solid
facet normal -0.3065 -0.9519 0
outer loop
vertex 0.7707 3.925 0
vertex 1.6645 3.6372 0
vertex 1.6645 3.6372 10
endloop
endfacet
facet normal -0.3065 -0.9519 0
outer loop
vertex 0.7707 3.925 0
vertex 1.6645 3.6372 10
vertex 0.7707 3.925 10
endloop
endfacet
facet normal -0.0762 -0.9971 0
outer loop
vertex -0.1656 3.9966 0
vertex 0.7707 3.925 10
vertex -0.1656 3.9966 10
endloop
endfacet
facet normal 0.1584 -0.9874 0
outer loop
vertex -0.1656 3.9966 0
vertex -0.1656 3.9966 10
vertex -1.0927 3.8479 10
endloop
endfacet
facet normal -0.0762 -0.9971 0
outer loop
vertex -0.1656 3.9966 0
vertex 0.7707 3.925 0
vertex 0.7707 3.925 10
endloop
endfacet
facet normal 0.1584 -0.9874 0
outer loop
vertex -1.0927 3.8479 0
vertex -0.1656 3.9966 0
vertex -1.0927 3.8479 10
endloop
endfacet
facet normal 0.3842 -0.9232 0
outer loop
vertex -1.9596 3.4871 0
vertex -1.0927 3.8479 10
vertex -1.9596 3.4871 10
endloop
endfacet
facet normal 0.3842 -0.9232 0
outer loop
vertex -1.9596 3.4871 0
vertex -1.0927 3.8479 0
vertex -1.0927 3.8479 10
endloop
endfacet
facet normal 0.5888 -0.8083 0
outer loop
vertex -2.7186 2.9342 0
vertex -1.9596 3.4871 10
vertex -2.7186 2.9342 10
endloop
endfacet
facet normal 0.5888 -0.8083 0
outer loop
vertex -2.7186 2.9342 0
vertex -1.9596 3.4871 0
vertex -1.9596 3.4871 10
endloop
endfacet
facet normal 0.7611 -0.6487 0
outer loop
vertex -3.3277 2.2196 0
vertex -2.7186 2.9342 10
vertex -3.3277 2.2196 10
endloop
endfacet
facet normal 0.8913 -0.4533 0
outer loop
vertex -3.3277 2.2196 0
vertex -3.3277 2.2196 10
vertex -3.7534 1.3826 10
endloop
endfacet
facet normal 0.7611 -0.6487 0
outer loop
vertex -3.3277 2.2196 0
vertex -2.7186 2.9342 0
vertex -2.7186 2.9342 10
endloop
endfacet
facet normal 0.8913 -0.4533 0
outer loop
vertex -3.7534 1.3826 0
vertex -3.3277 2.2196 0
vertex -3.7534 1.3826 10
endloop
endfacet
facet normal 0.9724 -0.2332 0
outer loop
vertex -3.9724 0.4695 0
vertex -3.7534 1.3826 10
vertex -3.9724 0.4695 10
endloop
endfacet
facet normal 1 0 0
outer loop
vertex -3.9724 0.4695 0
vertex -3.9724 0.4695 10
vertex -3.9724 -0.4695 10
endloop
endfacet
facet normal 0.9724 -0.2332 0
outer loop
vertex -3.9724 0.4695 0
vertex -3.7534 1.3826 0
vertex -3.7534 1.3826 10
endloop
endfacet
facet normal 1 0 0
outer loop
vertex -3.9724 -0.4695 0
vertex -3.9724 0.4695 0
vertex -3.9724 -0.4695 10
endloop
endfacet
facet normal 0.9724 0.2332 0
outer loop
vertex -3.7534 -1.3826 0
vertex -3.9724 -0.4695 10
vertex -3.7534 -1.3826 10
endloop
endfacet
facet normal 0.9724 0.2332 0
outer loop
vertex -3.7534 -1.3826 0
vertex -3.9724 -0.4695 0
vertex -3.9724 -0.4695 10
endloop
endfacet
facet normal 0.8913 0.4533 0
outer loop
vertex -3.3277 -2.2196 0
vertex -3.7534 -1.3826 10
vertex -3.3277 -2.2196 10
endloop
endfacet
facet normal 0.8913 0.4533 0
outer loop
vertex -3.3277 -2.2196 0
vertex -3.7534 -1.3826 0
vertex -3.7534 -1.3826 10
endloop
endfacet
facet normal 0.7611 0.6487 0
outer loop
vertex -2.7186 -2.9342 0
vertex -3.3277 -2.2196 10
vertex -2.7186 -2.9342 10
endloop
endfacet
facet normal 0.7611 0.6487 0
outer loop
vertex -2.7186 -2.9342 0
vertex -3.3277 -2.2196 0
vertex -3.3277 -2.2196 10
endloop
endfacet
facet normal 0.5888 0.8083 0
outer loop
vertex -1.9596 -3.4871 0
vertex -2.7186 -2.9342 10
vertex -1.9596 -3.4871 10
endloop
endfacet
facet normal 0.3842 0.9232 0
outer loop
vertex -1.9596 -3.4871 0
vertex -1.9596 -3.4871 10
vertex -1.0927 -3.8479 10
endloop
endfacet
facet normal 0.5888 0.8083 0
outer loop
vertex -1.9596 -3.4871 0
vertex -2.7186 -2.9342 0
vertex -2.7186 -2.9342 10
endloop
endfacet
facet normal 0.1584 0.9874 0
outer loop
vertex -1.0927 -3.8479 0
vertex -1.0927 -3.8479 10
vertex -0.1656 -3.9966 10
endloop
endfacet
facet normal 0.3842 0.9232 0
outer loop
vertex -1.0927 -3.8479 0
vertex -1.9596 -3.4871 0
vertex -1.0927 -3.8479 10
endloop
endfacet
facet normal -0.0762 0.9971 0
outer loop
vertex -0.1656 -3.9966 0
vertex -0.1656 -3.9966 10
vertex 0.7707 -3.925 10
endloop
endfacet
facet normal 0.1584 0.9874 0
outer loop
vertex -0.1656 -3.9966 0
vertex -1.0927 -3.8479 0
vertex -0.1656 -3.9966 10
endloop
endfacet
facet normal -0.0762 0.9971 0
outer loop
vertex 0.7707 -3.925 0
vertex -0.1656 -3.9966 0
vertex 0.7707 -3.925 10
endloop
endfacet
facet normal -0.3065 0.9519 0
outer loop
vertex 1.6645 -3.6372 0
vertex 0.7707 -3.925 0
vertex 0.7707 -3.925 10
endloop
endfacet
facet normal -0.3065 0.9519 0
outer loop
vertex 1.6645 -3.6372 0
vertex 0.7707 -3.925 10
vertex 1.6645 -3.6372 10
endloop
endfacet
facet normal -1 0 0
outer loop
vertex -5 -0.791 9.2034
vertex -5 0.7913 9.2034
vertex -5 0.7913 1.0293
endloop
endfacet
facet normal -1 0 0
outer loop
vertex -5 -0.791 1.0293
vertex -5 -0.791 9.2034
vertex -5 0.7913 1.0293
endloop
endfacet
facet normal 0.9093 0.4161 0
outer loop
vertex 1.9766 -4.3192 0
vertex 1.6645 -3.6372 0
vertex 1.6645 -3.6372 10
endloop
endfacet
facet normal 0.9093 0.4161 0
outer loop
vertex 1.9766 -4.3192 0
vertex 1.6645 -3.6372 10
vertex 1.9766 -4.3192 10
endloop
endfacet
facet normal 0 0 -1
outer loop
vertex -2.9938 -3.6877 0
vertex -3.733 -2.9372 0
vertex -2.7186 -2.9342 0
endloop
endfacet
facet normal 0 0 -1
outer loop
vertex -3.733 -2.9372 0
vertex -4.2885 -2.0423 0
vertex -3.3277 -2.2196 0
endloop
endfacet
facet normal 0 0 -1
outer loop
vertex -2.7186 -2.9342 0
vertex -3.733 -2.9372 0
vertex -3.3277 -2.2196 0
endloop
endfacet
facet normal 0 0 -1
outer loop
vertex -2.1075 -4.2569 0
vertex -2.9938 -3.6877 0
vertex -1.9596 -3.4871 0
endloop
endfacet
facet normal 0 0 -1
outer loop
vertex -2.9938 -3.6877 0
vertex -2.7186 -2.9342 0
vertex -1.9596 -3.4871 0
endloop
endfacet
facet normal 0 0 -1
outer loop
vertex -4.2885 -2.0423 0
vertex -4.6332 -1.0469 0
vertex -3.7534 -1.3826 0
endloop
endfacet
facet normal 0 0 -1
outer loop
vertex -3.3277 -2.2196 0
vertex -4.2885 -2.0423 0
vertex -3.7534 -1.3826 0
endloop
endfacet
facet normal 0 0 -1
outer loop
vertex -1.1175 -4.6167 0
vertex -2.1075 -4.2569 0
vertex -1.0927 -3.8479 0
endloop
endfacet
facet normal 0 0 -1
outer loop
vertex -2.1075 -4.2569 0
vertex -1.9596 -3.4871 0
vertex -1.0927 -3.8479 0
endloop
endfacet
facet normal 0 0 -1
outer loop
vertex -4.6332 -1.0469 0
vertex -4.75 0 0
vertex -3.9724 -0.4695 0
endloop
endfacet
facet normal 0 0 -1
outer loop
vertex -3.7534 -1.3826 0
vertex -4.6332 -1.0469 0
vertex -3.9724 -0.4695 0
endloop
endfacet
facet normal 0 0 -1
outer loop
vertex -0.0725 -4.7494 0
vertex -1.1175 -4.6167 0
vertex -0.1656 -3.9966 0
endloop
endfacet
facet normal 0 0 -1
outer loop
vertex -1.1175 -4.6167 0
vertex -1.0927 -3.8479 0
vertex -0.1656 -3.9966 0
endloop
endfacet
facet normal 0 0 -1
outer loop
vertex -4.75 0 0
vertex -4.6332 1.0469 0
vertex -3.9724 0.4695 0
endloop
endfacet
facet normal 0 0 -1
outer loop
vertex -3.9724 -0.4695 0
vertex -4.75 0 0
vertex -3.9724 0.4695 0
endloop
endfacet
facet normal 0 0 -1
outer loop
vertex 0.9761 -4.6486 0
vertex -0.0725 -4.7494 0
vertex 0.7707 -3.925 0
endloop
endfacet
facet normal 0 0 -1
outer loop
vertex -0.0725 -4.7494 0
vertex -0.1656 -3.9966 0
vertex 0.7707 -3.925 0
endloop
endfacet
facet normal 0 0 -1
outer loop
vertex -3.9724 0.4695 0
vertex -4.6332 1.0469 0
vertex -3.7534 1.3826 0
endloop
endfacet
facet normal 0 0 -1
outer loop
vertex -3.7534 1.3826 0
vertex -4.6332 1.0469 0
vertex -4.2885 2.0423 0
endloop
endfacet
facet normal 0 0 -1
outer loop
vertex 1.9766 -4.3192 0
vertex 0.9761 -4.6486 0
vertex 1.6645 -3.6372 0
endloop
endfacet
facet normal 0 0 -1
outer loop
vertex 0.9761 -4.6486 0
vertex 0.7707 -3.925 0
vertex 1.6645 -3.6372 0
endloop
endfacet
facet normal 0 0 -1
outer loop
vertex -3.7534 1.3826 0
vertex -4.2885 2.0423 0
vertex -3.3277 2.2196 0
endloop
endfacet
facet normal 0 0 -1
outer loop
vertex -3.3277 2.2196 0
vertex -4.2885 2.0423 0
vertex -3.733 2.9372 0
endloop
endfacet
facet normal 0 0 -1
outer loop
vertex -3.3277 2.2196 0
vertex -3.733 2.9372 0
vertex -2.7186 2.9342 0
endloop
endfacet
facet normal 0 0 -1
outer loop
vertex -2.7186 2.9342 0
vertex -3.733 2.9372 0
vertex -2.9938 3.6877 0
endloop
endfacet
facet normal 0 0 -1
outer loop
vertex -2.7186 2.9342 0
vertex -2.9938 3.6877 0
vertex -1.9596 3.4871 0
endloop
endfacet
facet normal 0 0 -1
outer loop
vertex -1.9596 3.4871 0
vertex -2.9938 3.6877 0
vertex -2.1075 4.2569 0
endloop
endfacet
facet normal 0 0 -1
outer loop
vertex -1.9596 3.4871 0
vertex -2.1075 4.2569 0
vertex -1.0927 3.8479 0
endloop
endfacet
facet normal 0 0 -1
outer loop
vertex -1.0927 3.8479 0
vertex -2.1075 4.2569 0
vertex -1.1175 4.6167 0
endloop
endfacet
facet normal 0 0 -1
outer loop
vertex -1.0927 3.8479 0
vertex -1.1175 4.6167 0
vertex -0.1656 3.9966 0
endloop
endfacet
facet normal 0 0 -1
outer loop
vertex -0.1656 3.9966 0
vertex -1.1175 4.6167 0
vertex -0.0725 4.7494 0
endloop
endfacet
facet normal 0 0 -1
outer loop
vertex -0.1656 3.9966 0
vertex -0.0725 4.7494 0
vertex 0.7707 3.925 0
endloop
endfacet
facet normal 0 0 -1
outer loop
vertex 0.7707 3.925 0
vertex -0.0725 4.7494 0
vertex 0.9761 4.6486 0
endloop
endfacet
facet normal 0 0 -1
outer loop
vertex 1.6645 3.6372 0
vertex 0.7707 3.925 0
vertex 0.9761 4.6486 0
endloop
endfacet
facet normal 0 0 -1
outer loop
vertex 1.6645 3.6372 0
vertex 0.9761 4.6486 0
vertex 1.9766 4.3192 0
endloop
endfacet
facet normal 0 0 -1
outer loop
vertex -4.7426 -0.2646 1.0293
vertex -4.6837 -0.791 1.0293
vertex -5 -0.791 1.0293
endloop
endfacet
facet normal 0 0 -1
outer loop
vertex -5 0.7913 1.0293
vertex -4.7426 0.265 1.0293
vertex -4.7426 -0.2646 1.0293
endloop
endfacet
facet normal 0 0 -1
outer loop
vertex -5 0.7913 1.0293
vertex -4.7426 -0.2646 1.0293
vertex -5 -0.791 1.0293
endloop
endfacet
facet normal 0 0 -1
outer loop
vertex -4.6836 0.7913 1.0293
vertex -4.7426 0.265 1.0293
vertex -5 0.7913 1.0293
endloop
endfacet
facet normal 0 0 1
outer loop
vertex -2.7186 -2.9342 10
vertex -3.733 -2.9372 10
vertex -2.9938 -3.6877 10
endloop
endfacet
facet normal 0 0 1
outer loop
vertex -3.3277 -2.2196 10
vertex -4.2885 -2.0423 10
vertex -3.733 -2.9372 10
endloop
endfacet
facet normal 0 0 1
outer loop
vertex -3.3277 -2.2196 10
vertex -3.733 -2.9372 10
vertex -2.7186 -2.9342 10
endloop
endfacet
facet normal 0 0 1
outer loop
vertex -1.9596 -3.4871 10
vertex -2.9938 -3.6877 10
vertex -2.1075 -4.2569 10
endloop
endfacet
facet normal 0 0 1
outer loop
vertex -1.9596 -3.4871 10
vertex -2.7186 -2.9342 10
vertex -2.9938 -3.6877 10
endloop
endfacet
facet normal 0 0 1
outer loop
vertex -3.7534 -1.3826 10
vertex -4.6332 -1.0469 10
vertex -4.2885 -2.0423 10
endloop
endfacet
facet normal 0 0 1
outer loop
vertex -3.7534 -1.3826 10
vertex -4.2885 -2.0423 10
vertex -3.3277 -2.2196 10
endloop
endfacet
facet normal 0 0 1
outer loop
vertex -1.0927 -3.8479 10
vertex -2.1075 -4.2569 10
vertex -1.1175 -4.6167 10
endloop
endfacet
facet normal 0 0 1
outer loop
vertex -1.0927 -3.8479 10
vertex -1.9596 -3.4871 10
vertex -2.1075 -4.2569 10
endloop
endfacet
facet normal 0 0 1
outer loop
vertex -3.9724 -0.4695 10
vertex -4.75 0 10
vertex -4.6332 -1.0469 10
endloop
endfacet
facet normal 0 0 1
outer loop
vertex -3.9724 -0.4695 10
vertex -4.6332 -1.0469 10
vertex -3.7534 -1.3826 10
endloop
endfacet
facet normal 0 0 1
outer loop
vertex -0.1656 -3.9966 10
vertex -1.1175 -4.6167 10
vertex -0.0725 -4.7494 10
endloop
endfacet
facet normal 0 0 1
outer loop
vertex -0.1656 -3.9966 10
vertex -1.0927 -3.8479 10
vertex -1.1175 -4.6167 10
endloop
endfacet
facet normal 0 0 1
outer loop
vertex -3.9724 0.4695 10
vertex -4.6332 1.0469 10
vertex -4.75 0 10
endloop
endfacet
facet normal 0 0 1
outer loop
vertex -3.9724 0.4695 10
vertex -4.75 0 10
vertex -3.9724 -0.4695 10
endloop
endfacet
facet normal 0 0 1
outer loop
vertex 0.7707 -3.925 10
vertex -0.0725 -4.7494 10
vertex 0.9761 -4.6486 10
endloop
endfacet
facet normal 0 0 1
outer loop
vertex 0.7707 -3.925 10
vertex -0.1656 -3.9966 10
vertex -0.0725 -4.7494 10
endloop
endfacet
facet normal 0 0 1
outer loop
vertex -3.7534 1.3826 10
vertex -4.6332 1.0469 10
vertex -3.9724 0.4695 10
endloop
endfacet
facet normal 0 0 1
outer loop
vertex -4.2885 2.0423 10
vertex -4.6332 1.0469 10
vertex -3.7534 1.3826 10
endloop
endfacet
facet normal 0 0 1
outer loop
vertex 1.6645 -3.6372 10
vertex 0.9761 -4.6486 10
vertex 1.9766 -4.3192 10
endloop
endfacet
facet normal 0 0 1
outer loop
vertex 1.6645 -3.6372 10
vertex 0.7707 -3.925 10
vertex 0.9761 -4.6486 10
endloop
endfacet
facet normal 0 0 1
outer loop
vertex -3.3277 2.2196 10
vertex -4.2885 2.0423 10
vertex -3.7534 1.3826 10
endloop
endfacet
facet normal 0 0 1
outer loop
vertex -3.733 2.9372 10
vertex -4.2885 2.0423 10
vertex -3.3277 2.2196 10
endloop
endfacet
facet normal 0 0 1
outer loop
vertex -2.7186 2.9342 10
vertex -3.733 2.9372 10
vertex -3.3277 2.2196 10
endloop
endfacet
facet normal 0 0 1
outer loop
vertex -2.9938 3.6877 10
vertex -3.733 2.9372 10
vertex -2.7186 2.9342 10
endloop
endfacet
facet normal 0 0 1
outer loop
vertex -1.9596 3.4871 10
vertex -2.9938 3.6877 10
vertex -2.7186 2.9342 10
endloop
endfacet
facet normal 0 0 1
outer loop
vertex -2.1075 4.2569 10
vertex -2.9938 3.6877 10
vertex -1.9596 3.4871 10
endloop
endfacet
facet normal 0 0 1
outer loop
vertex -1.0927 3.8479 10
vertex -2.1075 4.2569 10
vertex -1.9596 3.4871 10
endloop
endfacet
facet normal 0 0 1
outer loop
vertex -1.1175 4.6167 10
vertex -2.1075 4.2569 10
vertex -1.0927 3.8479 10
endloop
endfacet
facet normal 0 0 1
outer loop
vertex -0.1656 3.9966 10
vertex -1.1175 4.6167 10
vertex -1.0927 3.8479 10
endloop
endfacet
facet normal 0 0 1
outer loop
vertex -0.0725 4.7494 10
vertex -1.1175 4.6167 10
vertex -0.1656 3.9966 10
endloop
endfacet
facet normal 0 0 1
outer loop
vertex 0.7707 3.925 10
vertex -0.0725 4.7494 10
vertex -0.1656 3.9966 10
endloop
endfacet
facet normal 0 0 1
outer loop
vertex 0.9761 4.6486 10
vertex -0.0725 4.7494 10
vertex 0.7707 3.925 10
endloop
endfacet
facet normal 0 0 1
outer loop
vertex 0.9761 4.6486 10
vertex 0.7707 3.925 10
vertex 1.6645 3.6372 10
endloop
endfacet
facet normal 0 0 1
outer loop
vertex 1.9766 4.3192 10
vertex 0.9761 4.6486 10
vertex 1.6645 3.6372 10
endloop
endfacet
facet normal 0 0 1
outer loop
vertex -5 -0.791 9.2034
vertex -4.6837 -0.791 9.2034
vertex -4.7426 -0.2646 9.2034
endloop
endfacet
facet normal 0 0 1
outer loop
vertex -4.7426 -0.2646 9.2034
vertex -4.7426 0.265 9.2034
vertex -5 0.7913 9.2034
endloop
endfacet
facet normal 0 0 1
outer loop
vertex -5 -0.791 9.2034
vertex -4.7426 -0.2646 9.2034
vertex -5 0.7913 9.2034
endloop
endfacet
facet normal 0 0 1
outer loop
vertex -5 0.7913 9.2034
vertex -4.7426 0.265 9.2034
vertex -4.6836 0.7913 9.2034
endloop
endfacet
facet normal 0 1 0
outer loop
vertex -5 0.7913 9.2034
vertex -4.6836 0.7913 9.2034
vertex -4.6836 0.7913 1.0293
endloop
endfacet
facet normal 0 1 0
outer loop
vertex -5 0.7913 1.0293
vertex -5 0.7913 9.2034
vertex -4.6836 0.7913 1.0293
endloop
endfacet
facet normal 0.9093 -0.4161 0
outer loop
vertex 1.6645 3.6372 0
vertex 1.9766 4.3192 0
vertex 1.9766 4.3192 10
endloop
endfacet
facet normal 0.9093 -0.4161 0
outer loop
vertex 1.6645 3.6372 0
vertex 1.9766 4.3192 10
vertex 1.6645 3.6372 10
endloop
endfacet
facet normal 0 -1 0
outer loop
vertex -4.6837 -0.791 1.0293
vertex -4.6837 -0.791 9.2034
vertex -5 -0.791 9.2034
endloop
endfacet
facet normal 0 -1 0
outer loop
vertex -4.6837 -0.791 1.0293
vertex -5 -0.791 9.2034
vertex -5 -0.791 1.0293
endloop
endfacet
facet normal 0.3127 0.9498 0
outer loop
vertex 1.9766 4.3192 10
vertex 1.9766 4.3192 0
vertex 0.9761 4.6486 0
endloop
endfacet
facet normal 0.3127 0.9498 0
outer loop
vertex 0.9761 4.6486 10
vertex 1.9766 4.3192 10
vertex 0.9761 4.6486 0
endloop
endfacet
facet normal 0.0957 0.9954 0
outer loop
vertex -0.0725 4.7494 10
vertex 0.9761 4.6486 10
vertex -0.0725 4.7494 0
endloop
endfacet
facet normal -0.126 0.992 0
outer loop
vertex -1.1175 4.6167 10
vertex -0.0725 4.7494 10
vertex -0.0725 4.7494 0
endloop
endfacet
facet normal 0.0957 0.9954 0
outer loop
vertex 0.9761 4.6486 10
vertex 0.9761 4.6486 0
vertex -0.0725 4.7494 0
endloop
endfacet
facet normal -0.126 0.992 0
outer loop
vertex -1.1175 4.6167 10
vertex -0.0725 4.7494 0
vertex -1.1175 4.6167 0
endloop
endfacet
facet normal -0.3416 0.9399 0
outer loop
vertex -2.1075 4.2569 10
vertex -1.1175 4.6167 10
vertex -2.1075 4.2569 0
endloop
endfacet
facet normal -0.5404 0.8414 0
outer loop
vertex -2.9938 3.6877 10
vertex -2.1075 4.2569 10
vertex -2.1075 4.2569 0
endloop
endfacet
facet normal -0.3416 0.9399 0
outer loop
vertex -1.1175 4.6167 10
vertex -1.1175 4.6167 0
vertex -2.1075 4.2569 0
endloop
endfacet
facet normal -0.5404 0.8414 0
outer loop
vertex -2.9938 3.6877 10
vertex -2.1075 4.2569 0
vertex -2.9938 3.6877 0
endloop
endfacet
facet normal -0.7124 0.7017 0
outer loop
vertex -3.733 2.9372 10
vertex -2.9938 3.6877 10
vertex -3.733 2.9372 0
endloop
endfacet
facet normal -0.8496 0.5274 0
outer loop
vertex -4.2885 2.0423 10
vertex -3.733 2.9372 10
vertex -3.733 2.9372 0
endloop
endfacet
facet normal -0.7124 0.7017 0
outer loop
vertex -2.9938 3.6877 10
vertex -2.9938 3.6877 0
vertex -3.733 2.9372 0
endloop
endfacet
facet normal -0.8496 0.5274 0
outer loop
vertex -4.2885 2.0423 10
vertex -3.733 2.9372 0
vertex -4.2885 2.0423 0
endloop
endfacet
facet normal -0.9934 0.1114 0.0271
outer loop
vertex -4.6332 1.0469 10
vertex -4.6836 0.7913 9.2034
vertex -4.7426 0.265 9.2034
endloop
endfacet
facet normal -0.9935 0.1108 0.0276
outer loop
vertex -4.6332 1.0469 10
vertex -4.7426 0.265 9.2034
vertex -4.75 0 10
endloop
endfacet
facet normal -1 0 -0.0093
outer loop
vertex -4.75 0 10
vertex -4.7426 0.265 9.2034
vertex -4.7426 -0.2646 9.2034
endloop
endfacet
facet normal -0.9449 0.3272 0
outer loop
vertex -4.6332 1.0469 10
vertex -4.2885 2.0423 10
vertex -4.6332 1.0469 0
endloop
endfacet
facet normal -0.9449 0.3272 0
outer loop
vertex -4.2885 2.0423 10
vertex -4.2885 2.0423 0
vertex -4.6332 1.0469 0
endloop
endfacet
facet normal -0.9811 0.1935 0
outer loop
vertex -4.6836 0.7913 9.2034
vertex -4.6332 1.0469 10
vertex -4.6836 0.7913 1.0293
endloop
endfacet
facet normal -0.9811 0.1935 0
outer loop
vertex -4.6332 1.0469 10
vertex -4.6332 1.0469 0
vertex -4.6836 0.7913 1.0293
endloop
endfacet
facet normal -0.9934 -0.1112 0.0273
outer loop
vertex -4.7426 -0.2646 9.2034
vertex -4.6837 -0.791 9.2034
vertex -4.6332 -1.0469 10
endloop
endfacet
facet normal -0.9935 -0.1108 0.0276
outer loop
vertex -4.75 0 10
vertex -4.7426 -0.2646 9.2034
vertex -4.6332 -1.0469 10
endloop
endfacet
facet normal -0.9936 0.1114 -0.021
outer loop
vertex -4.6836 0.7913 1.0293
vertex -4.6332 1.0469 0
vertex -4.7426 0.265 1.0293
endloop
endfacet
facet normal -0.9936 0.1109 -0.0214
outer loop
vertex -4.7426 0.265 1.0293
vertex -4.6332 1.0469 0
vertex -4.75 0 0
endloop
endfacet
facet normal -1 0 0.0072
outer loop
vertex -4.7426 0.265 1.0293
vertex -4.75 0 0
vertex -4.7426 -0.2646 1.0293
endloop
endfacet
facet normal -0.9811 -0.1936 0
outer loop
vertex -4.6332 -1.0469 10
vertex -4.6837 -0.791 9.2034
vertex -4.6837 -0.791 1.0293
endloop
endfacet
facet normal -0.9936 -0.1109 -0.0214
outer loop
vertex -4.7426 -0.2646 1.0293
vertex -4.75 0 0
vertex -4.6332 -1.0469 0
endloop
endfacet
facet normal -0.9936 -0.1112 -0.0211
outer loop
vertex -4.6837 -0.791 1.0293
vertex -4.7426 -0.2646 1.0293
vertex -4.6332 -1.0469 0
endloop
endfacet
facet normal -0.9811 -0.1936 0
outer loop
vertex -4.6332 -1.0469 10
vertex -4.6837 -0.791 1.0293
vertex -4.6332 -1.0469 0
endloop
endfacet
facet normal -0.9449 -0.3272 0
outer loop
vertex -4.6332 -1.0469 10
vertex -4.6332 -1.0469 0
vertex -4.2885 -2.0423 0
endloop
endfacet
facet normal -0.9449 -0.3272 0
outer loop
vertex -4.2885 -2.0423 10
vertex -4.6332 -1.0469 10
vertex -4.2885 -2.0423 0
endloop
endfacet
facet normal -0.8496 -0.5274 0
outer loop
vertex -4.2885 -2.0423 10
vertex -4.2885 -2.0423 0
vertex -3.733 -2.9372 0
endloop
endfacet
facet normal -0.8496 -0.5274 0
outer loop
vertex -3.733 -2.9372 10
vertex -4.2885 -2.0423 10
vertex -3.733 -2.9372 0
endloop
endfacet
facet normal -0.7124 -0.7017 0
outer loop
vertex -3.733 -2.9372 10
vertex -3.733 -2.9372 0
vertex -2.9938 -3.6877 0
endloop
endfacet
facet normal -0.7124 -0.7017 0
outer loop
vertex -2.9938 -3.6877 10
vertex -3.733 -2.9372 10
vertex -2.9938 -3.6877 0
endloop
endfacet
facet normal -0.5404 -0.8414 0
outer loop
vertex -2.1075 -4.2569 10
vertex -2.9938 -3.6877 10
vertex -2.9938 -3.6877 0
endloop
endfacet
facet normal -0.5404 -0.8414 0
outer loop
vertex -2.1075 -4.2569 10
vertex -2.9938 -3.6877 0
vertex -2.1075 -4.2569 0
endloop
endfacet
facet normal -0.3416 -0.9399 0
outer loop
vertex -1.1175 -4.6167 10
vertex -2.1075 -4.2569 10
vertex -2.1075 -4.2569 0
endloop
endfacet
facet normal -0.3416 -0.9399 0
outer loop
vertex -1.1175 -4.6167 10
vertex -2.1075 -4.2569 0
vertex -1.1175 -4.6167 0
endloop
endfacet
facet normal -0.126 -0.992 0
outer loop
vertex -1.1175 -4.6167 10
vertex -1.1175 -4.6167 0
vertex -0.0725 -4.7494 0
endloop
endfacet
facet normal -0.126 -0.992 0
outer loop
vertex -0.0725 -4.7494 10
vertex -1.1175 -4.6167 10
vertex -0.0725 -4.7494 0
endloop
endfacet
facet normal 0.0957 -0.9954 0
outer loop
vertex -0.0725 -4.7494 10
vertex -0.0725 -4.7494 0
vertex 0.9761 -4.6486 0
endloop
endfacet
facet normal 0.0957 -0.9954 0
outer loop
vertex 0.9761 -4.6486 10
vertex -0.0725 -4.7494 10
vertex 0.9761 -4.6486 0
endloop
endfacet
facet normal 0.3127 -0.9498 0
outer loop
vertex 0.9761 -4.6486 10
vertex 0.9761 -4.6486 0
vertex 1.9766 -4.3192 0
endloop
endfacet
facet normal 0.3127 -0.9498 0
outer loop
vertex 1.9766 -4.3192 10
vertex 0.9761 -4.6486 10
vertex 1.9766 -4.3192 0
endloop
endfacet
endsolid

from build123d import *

# Parameters (mm, degrees)
SKETCH1_R           = 4.75
SKETCH1_R_2         = 4
BOSS_EXTRUDE1_DEPTH = 10
CUT_EXTRUDE2_DEPTH  = 10
SKETCH4_W           = 8.174166442
SKETCH4_H           = 1.582309943
BOSS_EXTRUDE2_DEPTH = 0.5


with BuildPart() as part:
    # Sketch1 → Boss-Extrude1 (new body)
    with BuildSketch(Plane.XY):
        Circle(SKETCH1_R)
        Circle(SKETCH1_R_2, mode=Mode.SUBTRACT)
    extrude(amount=BOSS_EXTRUDE1_DEPTH)

    # Sketch3 → Cut-Extrude2 (cut)
    with BuildSketch(Plane.XY.offset(10)):
        with BuildLine():
            ThreePointArc((1.66450103, 3.637229209), (3.365858295, 2.161249162), (4, 0))
            Line((4, 0), (4.75, 0))
            ThreePointArc((4.75, 0), (4.749994219, 0.007410728), (4.749976876, 0.014821438))
            ThreePointArc((4.749976876, 0.014821438), (3.992947753, 2.572716122), (1.976594973, 4.319209686))
            Line((1.976594973, 4.319209686), (1.66450103, 3.637229209))
        make_face()
        with BuildLine():
            Line((4.75, 0), (4, 0))
            ThreePointArc((4, 0), (3.365858295, -2.161249162), (1.66450103, -3.637229209))
            Line((1.66450103, -3.637229209), (1.976594973, -4.319209686))
            ThreePointArc((1.976594973, -4.319209686), (3.996956725, -2.56648338), (4.75, 0))
        make_face()
    extrude(amount=-CUT_EXTRUDE2_DEPTH, mode=Mode.SUBTRACT)

    # Sketch4 → Boss-Extrude2 (add)
    with BuildSketch(Plane(origin=(-4.5, 0, 0), x_dir=(0, 0, -1), z_dir=(1, 0, 0))):
        with Locations((-5.116351143, 0.000178202)):
            Rectangle(SKETCH4_W, SKETCH4_H)
    extrude(amount=-BOSS_EXTRUDE2_DEPTH)


solid = part.part
